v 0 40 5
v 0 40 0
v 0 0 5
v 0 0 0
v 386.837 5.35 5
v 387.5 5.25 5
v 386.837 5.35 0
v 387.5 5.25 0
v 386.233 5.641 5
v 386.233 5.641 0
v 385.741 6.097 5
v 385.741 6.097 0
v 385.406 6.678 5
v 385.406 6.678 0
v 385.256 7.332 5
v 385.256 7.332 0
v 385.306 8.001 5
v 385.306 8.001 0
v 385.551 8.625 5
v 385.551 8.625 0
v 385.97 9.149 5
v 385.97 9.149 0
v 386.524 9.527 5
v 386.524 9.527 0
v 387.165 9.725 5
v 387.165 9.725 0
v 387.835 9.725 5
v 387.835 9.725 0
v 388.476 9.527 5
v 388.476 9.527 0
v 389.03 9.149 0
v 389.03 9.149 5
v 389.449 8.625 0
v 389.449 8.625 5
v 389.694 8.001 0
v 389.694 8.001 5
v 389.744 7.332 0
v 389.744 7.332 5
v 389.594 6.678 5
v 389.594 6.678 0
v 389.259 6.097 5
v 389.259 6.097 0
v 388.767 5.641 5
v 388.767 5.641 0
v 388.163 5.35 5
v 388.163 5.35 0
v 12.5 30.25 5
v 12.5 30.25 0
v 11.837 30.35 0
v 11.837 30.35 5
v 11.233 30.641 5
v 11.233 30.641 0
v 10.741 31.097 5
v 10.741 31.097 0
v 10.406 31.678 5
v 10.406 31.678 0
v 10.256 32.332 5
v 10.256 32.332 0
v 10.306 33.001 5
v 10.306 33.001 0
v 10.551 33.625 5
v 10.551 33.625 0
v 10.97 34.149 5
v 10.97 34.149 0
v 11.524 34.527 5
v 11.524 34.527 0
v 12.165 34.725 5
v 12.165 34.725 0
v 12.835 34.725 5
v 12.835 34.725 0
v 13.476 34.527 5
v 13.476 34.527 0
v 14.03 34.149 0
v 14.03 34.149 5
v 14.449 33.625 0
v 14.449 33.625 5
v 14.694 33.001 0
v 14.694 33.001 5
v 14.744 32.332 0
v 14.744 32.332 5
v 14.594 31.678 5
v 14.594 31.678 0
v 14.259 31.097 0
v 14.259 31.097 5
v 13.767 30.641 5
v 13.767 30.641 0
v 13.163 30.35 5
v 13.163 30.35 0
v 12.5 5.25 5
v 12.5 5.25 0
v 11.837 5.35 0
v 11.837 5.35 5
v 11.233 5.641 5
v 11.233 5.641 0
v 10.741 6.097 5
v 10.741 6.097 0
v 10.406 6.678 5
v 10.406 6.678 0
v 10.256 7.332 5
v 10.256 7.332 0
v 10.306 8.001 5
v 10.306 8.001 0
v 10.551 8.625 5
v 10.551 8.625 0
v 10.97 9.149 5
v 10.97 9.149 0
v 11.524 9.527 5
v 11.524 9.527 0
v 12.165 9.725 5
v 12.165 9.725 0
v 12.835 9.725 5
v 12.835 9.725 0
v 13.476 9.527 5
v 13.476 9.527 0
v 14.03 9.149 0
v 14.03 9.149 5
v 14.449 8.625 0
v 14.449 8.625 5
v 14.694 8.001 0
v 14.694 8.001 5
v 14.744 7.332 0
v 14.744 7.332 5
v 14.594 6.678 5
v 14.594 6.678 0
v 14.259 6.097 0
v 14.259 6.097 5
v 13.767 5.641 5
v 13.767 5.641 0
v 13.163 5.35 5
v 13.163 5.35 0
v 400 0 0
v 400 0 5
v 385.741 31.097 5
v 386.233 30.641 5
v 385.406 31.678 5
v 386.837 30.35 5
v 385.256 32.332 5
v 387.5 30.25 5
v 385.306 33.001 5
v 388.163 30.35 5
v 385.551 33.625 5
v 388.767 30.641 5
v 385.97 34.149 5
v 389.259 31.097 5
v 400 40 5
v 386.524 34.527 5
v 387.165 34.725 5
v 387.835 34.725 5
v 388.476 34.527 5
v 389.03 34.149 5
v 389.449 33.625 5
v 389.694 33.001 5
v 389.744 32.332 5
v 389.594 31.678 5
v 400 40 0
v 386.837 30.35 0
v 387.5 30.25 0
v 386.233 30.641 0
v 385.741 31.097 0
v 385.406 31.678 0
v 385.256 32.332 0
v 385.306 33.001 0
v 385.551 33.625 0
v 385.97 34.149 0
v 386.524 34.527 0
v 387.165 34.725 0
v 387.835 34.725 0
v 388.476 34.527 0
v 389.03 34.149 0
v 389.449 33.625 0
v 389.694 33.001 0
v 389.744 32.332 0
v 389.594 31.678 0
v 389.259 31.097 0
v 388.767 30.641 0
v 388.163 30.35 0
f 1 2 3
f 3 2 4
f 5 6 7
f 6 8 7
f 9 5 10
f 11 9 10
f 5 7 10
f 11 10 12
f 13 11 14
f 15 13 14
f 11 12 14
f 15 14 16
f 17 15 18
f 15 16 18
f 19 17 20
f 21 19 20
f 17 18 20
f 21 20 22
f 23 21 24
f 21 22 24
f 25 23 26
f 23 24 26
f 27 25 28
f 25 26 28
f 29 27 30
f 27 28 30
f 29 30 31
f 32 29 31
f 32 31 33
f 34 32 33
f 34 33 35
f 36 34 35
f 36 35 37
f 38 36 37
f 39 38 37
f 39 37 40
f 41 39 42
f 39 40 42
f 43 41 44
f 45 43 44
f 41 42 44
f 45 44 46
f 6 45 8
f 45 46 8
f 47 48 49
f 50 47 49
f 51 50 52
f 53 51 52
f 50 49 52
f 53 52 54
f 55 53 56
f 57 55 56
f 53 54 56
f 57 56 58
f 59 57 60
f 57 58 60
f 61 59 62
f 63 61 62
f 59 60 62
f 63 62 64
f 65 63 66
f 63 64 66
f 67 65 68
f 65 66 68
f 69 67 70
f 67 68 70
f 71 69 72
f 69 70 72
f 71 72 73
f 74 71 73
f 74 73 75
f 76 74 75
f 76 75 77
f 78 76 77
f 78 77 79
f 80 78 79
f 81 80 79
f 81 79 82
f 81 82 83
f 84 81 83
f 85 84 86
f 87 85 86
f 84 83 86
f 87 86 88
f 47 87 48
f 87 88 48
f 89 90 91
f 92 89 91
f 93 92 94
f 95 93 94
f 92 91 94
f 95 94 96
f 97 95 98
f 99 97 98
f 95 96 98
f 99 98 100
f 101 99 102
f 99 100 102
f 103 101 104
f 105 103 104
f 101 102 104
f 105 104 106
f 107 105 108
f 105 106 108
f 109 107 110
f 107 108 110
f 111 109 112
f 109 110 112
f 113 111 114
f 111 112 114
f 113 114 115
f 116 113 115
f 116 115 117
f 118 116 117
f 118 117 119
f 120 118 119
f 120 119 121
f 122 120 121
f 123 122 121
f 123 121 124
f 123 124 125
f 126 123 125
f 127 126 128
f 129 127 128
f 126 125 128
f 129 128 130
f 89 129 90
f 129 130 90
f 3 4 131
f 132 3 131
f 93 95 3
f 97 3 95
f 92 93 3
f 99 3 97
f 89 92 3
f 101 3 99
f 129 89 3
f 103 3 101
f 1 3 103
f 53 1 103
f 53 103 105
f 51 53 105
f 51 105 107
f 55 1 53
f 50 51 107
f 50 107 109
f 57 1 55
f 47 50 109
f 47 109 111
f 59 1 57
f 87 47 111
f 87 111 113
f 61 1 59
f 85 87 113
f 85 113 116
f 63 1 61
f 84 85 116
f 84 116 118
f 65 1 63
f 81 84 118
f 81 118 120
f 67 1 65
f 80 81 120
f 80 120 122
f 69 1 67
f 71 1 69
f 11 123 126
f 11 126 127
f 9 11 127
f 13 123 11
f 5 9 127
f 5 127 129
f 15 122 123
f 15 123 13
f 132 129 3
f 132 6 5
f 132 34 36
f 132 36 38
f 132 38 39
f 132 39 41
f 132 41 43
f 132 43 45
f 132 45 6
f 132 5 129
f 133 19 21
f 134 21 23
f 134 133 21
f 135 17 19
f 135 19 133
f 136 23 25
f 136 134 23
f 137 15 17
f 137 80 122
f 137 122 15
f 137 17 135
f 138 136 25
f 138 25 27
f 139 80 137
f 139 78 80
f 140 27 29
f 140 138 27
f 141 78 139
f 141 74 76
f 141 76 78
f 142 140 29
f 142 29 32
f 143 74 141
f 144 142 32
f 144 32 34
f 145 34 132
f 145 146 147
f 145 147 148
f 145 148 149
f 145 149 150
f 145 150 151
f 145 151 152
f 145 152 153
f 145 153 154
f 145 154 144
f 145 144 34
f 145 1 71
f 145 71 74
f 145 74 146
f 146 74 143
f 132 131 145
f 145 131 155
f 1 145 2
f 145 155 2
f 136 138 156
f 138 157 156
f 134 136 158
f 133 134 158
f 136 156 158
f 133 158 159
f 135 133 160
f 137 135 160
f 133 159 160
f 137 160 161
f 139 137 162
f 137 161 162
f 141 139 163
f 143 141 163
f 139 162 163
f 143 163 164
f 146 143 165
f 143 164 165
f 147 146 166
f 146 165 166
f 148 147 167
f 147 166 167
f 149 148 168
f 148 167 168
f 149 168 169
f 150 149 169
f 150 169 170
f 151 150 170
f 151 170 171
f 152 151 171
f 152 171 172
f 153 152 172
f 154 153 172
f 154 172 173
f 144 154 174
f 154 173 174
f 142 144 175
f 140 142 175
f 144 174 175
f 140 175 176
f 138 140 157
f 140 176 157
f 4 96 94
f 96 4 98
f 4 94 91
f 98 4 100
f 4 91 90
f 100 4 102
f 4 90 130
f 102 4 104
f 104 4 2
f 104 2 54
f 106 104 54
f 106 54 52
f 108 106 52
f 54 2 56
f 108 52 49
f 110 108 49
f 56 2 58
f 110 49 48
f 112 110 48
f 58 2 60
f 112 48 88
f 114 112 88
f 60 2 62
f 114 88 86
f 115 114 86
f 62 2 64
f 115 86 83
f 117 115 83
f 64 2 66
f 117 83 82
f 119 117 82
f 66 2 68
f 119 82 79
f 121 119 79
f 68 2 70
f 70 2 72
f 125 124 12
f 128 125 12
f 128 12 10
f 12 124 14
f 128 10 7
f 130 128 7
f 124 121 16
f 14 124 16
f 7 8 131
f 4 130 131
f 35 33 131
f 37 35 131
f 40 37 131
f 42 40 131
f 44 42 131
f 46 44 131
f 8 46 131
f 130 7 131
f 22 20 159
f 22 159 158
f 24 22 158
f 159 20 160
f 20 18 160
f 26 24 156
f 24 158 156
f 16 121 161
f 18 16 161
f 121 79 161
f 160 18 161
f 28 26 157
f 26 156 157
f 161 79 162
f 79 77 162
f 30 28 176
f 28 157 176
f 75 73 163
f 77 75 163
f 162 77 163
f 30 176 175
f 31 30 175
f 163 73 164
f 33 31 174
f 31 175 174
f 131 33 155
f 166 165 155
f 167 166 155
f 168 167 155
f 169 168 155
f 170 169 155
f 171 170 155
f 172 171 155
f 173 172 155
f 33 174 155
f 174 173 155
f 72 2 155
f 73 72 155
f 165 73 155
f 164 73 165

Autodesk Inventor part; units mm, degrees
ref_plane "YZ Plane" through (0, 0, 0) normal (1, 0, 0) x (0, 1, 0)
ref_plane "XZ Plane" through (0, 0, 0) normal (0, 1, 0) x (-1, 0, 0)
ref_plane "XY Plane" through (0, 0, 0) normal (0, 0, 1) x (1, 0, 0)
sketch "Sketch1" plane through (0, 0, 0) normal (0, 0, 1) x (1, 0, 0)
  line L0 (0, 0) -> (400, 0)
  line L1 (400, 0) -> (400, 40)
  line L2 (400, 40) -> (0, 40)
  line L3 (0, 40) -> (0, 0)
  dimension "d0" = 400
  dimension "d1" = 40
extrude "Extrusion1" add sketch "Sketch1" along normal blind 5
sketch "Sketch2" plane through (0, 0, 5) normal (0, 0, 1) x (1, 0, 0)
  line L0 (400, 40) -> (0, 40) projected
  line L1 (0, 40) -> (0, 0) projected
  line L2 (0, 0) -> (400, 0) projected
  line L3 (400, 0) -> (400, 40) projected
  point P0 (12.5, 32.5)
  point P1 (12.5, 7.5)
  point P2 (387.5, 32.5)
  point P3 (387.5, 7.5)
  dimension "d4" = 7.5
  dimension "d5" = 12.5
  dimension "d6" = 7.5
  dimension "d7" = 12.5
hole "Hole1" at (12.5, 32.5, 5) at (12.5, 7.5, 5) at (387.5, 32.5, 5) at (387.5, 7.5, 5) direction (0, 0, -1) diameter 4.5 end through all clearance for "Flat Head Machine Screw" size "M4" standard "Ansi Metric M Profile"
equation "\"d6\" = d4"
equation "\"d7\" = d5"
properties part number "Top_End Piece 1" material "Wood (Birch)"
